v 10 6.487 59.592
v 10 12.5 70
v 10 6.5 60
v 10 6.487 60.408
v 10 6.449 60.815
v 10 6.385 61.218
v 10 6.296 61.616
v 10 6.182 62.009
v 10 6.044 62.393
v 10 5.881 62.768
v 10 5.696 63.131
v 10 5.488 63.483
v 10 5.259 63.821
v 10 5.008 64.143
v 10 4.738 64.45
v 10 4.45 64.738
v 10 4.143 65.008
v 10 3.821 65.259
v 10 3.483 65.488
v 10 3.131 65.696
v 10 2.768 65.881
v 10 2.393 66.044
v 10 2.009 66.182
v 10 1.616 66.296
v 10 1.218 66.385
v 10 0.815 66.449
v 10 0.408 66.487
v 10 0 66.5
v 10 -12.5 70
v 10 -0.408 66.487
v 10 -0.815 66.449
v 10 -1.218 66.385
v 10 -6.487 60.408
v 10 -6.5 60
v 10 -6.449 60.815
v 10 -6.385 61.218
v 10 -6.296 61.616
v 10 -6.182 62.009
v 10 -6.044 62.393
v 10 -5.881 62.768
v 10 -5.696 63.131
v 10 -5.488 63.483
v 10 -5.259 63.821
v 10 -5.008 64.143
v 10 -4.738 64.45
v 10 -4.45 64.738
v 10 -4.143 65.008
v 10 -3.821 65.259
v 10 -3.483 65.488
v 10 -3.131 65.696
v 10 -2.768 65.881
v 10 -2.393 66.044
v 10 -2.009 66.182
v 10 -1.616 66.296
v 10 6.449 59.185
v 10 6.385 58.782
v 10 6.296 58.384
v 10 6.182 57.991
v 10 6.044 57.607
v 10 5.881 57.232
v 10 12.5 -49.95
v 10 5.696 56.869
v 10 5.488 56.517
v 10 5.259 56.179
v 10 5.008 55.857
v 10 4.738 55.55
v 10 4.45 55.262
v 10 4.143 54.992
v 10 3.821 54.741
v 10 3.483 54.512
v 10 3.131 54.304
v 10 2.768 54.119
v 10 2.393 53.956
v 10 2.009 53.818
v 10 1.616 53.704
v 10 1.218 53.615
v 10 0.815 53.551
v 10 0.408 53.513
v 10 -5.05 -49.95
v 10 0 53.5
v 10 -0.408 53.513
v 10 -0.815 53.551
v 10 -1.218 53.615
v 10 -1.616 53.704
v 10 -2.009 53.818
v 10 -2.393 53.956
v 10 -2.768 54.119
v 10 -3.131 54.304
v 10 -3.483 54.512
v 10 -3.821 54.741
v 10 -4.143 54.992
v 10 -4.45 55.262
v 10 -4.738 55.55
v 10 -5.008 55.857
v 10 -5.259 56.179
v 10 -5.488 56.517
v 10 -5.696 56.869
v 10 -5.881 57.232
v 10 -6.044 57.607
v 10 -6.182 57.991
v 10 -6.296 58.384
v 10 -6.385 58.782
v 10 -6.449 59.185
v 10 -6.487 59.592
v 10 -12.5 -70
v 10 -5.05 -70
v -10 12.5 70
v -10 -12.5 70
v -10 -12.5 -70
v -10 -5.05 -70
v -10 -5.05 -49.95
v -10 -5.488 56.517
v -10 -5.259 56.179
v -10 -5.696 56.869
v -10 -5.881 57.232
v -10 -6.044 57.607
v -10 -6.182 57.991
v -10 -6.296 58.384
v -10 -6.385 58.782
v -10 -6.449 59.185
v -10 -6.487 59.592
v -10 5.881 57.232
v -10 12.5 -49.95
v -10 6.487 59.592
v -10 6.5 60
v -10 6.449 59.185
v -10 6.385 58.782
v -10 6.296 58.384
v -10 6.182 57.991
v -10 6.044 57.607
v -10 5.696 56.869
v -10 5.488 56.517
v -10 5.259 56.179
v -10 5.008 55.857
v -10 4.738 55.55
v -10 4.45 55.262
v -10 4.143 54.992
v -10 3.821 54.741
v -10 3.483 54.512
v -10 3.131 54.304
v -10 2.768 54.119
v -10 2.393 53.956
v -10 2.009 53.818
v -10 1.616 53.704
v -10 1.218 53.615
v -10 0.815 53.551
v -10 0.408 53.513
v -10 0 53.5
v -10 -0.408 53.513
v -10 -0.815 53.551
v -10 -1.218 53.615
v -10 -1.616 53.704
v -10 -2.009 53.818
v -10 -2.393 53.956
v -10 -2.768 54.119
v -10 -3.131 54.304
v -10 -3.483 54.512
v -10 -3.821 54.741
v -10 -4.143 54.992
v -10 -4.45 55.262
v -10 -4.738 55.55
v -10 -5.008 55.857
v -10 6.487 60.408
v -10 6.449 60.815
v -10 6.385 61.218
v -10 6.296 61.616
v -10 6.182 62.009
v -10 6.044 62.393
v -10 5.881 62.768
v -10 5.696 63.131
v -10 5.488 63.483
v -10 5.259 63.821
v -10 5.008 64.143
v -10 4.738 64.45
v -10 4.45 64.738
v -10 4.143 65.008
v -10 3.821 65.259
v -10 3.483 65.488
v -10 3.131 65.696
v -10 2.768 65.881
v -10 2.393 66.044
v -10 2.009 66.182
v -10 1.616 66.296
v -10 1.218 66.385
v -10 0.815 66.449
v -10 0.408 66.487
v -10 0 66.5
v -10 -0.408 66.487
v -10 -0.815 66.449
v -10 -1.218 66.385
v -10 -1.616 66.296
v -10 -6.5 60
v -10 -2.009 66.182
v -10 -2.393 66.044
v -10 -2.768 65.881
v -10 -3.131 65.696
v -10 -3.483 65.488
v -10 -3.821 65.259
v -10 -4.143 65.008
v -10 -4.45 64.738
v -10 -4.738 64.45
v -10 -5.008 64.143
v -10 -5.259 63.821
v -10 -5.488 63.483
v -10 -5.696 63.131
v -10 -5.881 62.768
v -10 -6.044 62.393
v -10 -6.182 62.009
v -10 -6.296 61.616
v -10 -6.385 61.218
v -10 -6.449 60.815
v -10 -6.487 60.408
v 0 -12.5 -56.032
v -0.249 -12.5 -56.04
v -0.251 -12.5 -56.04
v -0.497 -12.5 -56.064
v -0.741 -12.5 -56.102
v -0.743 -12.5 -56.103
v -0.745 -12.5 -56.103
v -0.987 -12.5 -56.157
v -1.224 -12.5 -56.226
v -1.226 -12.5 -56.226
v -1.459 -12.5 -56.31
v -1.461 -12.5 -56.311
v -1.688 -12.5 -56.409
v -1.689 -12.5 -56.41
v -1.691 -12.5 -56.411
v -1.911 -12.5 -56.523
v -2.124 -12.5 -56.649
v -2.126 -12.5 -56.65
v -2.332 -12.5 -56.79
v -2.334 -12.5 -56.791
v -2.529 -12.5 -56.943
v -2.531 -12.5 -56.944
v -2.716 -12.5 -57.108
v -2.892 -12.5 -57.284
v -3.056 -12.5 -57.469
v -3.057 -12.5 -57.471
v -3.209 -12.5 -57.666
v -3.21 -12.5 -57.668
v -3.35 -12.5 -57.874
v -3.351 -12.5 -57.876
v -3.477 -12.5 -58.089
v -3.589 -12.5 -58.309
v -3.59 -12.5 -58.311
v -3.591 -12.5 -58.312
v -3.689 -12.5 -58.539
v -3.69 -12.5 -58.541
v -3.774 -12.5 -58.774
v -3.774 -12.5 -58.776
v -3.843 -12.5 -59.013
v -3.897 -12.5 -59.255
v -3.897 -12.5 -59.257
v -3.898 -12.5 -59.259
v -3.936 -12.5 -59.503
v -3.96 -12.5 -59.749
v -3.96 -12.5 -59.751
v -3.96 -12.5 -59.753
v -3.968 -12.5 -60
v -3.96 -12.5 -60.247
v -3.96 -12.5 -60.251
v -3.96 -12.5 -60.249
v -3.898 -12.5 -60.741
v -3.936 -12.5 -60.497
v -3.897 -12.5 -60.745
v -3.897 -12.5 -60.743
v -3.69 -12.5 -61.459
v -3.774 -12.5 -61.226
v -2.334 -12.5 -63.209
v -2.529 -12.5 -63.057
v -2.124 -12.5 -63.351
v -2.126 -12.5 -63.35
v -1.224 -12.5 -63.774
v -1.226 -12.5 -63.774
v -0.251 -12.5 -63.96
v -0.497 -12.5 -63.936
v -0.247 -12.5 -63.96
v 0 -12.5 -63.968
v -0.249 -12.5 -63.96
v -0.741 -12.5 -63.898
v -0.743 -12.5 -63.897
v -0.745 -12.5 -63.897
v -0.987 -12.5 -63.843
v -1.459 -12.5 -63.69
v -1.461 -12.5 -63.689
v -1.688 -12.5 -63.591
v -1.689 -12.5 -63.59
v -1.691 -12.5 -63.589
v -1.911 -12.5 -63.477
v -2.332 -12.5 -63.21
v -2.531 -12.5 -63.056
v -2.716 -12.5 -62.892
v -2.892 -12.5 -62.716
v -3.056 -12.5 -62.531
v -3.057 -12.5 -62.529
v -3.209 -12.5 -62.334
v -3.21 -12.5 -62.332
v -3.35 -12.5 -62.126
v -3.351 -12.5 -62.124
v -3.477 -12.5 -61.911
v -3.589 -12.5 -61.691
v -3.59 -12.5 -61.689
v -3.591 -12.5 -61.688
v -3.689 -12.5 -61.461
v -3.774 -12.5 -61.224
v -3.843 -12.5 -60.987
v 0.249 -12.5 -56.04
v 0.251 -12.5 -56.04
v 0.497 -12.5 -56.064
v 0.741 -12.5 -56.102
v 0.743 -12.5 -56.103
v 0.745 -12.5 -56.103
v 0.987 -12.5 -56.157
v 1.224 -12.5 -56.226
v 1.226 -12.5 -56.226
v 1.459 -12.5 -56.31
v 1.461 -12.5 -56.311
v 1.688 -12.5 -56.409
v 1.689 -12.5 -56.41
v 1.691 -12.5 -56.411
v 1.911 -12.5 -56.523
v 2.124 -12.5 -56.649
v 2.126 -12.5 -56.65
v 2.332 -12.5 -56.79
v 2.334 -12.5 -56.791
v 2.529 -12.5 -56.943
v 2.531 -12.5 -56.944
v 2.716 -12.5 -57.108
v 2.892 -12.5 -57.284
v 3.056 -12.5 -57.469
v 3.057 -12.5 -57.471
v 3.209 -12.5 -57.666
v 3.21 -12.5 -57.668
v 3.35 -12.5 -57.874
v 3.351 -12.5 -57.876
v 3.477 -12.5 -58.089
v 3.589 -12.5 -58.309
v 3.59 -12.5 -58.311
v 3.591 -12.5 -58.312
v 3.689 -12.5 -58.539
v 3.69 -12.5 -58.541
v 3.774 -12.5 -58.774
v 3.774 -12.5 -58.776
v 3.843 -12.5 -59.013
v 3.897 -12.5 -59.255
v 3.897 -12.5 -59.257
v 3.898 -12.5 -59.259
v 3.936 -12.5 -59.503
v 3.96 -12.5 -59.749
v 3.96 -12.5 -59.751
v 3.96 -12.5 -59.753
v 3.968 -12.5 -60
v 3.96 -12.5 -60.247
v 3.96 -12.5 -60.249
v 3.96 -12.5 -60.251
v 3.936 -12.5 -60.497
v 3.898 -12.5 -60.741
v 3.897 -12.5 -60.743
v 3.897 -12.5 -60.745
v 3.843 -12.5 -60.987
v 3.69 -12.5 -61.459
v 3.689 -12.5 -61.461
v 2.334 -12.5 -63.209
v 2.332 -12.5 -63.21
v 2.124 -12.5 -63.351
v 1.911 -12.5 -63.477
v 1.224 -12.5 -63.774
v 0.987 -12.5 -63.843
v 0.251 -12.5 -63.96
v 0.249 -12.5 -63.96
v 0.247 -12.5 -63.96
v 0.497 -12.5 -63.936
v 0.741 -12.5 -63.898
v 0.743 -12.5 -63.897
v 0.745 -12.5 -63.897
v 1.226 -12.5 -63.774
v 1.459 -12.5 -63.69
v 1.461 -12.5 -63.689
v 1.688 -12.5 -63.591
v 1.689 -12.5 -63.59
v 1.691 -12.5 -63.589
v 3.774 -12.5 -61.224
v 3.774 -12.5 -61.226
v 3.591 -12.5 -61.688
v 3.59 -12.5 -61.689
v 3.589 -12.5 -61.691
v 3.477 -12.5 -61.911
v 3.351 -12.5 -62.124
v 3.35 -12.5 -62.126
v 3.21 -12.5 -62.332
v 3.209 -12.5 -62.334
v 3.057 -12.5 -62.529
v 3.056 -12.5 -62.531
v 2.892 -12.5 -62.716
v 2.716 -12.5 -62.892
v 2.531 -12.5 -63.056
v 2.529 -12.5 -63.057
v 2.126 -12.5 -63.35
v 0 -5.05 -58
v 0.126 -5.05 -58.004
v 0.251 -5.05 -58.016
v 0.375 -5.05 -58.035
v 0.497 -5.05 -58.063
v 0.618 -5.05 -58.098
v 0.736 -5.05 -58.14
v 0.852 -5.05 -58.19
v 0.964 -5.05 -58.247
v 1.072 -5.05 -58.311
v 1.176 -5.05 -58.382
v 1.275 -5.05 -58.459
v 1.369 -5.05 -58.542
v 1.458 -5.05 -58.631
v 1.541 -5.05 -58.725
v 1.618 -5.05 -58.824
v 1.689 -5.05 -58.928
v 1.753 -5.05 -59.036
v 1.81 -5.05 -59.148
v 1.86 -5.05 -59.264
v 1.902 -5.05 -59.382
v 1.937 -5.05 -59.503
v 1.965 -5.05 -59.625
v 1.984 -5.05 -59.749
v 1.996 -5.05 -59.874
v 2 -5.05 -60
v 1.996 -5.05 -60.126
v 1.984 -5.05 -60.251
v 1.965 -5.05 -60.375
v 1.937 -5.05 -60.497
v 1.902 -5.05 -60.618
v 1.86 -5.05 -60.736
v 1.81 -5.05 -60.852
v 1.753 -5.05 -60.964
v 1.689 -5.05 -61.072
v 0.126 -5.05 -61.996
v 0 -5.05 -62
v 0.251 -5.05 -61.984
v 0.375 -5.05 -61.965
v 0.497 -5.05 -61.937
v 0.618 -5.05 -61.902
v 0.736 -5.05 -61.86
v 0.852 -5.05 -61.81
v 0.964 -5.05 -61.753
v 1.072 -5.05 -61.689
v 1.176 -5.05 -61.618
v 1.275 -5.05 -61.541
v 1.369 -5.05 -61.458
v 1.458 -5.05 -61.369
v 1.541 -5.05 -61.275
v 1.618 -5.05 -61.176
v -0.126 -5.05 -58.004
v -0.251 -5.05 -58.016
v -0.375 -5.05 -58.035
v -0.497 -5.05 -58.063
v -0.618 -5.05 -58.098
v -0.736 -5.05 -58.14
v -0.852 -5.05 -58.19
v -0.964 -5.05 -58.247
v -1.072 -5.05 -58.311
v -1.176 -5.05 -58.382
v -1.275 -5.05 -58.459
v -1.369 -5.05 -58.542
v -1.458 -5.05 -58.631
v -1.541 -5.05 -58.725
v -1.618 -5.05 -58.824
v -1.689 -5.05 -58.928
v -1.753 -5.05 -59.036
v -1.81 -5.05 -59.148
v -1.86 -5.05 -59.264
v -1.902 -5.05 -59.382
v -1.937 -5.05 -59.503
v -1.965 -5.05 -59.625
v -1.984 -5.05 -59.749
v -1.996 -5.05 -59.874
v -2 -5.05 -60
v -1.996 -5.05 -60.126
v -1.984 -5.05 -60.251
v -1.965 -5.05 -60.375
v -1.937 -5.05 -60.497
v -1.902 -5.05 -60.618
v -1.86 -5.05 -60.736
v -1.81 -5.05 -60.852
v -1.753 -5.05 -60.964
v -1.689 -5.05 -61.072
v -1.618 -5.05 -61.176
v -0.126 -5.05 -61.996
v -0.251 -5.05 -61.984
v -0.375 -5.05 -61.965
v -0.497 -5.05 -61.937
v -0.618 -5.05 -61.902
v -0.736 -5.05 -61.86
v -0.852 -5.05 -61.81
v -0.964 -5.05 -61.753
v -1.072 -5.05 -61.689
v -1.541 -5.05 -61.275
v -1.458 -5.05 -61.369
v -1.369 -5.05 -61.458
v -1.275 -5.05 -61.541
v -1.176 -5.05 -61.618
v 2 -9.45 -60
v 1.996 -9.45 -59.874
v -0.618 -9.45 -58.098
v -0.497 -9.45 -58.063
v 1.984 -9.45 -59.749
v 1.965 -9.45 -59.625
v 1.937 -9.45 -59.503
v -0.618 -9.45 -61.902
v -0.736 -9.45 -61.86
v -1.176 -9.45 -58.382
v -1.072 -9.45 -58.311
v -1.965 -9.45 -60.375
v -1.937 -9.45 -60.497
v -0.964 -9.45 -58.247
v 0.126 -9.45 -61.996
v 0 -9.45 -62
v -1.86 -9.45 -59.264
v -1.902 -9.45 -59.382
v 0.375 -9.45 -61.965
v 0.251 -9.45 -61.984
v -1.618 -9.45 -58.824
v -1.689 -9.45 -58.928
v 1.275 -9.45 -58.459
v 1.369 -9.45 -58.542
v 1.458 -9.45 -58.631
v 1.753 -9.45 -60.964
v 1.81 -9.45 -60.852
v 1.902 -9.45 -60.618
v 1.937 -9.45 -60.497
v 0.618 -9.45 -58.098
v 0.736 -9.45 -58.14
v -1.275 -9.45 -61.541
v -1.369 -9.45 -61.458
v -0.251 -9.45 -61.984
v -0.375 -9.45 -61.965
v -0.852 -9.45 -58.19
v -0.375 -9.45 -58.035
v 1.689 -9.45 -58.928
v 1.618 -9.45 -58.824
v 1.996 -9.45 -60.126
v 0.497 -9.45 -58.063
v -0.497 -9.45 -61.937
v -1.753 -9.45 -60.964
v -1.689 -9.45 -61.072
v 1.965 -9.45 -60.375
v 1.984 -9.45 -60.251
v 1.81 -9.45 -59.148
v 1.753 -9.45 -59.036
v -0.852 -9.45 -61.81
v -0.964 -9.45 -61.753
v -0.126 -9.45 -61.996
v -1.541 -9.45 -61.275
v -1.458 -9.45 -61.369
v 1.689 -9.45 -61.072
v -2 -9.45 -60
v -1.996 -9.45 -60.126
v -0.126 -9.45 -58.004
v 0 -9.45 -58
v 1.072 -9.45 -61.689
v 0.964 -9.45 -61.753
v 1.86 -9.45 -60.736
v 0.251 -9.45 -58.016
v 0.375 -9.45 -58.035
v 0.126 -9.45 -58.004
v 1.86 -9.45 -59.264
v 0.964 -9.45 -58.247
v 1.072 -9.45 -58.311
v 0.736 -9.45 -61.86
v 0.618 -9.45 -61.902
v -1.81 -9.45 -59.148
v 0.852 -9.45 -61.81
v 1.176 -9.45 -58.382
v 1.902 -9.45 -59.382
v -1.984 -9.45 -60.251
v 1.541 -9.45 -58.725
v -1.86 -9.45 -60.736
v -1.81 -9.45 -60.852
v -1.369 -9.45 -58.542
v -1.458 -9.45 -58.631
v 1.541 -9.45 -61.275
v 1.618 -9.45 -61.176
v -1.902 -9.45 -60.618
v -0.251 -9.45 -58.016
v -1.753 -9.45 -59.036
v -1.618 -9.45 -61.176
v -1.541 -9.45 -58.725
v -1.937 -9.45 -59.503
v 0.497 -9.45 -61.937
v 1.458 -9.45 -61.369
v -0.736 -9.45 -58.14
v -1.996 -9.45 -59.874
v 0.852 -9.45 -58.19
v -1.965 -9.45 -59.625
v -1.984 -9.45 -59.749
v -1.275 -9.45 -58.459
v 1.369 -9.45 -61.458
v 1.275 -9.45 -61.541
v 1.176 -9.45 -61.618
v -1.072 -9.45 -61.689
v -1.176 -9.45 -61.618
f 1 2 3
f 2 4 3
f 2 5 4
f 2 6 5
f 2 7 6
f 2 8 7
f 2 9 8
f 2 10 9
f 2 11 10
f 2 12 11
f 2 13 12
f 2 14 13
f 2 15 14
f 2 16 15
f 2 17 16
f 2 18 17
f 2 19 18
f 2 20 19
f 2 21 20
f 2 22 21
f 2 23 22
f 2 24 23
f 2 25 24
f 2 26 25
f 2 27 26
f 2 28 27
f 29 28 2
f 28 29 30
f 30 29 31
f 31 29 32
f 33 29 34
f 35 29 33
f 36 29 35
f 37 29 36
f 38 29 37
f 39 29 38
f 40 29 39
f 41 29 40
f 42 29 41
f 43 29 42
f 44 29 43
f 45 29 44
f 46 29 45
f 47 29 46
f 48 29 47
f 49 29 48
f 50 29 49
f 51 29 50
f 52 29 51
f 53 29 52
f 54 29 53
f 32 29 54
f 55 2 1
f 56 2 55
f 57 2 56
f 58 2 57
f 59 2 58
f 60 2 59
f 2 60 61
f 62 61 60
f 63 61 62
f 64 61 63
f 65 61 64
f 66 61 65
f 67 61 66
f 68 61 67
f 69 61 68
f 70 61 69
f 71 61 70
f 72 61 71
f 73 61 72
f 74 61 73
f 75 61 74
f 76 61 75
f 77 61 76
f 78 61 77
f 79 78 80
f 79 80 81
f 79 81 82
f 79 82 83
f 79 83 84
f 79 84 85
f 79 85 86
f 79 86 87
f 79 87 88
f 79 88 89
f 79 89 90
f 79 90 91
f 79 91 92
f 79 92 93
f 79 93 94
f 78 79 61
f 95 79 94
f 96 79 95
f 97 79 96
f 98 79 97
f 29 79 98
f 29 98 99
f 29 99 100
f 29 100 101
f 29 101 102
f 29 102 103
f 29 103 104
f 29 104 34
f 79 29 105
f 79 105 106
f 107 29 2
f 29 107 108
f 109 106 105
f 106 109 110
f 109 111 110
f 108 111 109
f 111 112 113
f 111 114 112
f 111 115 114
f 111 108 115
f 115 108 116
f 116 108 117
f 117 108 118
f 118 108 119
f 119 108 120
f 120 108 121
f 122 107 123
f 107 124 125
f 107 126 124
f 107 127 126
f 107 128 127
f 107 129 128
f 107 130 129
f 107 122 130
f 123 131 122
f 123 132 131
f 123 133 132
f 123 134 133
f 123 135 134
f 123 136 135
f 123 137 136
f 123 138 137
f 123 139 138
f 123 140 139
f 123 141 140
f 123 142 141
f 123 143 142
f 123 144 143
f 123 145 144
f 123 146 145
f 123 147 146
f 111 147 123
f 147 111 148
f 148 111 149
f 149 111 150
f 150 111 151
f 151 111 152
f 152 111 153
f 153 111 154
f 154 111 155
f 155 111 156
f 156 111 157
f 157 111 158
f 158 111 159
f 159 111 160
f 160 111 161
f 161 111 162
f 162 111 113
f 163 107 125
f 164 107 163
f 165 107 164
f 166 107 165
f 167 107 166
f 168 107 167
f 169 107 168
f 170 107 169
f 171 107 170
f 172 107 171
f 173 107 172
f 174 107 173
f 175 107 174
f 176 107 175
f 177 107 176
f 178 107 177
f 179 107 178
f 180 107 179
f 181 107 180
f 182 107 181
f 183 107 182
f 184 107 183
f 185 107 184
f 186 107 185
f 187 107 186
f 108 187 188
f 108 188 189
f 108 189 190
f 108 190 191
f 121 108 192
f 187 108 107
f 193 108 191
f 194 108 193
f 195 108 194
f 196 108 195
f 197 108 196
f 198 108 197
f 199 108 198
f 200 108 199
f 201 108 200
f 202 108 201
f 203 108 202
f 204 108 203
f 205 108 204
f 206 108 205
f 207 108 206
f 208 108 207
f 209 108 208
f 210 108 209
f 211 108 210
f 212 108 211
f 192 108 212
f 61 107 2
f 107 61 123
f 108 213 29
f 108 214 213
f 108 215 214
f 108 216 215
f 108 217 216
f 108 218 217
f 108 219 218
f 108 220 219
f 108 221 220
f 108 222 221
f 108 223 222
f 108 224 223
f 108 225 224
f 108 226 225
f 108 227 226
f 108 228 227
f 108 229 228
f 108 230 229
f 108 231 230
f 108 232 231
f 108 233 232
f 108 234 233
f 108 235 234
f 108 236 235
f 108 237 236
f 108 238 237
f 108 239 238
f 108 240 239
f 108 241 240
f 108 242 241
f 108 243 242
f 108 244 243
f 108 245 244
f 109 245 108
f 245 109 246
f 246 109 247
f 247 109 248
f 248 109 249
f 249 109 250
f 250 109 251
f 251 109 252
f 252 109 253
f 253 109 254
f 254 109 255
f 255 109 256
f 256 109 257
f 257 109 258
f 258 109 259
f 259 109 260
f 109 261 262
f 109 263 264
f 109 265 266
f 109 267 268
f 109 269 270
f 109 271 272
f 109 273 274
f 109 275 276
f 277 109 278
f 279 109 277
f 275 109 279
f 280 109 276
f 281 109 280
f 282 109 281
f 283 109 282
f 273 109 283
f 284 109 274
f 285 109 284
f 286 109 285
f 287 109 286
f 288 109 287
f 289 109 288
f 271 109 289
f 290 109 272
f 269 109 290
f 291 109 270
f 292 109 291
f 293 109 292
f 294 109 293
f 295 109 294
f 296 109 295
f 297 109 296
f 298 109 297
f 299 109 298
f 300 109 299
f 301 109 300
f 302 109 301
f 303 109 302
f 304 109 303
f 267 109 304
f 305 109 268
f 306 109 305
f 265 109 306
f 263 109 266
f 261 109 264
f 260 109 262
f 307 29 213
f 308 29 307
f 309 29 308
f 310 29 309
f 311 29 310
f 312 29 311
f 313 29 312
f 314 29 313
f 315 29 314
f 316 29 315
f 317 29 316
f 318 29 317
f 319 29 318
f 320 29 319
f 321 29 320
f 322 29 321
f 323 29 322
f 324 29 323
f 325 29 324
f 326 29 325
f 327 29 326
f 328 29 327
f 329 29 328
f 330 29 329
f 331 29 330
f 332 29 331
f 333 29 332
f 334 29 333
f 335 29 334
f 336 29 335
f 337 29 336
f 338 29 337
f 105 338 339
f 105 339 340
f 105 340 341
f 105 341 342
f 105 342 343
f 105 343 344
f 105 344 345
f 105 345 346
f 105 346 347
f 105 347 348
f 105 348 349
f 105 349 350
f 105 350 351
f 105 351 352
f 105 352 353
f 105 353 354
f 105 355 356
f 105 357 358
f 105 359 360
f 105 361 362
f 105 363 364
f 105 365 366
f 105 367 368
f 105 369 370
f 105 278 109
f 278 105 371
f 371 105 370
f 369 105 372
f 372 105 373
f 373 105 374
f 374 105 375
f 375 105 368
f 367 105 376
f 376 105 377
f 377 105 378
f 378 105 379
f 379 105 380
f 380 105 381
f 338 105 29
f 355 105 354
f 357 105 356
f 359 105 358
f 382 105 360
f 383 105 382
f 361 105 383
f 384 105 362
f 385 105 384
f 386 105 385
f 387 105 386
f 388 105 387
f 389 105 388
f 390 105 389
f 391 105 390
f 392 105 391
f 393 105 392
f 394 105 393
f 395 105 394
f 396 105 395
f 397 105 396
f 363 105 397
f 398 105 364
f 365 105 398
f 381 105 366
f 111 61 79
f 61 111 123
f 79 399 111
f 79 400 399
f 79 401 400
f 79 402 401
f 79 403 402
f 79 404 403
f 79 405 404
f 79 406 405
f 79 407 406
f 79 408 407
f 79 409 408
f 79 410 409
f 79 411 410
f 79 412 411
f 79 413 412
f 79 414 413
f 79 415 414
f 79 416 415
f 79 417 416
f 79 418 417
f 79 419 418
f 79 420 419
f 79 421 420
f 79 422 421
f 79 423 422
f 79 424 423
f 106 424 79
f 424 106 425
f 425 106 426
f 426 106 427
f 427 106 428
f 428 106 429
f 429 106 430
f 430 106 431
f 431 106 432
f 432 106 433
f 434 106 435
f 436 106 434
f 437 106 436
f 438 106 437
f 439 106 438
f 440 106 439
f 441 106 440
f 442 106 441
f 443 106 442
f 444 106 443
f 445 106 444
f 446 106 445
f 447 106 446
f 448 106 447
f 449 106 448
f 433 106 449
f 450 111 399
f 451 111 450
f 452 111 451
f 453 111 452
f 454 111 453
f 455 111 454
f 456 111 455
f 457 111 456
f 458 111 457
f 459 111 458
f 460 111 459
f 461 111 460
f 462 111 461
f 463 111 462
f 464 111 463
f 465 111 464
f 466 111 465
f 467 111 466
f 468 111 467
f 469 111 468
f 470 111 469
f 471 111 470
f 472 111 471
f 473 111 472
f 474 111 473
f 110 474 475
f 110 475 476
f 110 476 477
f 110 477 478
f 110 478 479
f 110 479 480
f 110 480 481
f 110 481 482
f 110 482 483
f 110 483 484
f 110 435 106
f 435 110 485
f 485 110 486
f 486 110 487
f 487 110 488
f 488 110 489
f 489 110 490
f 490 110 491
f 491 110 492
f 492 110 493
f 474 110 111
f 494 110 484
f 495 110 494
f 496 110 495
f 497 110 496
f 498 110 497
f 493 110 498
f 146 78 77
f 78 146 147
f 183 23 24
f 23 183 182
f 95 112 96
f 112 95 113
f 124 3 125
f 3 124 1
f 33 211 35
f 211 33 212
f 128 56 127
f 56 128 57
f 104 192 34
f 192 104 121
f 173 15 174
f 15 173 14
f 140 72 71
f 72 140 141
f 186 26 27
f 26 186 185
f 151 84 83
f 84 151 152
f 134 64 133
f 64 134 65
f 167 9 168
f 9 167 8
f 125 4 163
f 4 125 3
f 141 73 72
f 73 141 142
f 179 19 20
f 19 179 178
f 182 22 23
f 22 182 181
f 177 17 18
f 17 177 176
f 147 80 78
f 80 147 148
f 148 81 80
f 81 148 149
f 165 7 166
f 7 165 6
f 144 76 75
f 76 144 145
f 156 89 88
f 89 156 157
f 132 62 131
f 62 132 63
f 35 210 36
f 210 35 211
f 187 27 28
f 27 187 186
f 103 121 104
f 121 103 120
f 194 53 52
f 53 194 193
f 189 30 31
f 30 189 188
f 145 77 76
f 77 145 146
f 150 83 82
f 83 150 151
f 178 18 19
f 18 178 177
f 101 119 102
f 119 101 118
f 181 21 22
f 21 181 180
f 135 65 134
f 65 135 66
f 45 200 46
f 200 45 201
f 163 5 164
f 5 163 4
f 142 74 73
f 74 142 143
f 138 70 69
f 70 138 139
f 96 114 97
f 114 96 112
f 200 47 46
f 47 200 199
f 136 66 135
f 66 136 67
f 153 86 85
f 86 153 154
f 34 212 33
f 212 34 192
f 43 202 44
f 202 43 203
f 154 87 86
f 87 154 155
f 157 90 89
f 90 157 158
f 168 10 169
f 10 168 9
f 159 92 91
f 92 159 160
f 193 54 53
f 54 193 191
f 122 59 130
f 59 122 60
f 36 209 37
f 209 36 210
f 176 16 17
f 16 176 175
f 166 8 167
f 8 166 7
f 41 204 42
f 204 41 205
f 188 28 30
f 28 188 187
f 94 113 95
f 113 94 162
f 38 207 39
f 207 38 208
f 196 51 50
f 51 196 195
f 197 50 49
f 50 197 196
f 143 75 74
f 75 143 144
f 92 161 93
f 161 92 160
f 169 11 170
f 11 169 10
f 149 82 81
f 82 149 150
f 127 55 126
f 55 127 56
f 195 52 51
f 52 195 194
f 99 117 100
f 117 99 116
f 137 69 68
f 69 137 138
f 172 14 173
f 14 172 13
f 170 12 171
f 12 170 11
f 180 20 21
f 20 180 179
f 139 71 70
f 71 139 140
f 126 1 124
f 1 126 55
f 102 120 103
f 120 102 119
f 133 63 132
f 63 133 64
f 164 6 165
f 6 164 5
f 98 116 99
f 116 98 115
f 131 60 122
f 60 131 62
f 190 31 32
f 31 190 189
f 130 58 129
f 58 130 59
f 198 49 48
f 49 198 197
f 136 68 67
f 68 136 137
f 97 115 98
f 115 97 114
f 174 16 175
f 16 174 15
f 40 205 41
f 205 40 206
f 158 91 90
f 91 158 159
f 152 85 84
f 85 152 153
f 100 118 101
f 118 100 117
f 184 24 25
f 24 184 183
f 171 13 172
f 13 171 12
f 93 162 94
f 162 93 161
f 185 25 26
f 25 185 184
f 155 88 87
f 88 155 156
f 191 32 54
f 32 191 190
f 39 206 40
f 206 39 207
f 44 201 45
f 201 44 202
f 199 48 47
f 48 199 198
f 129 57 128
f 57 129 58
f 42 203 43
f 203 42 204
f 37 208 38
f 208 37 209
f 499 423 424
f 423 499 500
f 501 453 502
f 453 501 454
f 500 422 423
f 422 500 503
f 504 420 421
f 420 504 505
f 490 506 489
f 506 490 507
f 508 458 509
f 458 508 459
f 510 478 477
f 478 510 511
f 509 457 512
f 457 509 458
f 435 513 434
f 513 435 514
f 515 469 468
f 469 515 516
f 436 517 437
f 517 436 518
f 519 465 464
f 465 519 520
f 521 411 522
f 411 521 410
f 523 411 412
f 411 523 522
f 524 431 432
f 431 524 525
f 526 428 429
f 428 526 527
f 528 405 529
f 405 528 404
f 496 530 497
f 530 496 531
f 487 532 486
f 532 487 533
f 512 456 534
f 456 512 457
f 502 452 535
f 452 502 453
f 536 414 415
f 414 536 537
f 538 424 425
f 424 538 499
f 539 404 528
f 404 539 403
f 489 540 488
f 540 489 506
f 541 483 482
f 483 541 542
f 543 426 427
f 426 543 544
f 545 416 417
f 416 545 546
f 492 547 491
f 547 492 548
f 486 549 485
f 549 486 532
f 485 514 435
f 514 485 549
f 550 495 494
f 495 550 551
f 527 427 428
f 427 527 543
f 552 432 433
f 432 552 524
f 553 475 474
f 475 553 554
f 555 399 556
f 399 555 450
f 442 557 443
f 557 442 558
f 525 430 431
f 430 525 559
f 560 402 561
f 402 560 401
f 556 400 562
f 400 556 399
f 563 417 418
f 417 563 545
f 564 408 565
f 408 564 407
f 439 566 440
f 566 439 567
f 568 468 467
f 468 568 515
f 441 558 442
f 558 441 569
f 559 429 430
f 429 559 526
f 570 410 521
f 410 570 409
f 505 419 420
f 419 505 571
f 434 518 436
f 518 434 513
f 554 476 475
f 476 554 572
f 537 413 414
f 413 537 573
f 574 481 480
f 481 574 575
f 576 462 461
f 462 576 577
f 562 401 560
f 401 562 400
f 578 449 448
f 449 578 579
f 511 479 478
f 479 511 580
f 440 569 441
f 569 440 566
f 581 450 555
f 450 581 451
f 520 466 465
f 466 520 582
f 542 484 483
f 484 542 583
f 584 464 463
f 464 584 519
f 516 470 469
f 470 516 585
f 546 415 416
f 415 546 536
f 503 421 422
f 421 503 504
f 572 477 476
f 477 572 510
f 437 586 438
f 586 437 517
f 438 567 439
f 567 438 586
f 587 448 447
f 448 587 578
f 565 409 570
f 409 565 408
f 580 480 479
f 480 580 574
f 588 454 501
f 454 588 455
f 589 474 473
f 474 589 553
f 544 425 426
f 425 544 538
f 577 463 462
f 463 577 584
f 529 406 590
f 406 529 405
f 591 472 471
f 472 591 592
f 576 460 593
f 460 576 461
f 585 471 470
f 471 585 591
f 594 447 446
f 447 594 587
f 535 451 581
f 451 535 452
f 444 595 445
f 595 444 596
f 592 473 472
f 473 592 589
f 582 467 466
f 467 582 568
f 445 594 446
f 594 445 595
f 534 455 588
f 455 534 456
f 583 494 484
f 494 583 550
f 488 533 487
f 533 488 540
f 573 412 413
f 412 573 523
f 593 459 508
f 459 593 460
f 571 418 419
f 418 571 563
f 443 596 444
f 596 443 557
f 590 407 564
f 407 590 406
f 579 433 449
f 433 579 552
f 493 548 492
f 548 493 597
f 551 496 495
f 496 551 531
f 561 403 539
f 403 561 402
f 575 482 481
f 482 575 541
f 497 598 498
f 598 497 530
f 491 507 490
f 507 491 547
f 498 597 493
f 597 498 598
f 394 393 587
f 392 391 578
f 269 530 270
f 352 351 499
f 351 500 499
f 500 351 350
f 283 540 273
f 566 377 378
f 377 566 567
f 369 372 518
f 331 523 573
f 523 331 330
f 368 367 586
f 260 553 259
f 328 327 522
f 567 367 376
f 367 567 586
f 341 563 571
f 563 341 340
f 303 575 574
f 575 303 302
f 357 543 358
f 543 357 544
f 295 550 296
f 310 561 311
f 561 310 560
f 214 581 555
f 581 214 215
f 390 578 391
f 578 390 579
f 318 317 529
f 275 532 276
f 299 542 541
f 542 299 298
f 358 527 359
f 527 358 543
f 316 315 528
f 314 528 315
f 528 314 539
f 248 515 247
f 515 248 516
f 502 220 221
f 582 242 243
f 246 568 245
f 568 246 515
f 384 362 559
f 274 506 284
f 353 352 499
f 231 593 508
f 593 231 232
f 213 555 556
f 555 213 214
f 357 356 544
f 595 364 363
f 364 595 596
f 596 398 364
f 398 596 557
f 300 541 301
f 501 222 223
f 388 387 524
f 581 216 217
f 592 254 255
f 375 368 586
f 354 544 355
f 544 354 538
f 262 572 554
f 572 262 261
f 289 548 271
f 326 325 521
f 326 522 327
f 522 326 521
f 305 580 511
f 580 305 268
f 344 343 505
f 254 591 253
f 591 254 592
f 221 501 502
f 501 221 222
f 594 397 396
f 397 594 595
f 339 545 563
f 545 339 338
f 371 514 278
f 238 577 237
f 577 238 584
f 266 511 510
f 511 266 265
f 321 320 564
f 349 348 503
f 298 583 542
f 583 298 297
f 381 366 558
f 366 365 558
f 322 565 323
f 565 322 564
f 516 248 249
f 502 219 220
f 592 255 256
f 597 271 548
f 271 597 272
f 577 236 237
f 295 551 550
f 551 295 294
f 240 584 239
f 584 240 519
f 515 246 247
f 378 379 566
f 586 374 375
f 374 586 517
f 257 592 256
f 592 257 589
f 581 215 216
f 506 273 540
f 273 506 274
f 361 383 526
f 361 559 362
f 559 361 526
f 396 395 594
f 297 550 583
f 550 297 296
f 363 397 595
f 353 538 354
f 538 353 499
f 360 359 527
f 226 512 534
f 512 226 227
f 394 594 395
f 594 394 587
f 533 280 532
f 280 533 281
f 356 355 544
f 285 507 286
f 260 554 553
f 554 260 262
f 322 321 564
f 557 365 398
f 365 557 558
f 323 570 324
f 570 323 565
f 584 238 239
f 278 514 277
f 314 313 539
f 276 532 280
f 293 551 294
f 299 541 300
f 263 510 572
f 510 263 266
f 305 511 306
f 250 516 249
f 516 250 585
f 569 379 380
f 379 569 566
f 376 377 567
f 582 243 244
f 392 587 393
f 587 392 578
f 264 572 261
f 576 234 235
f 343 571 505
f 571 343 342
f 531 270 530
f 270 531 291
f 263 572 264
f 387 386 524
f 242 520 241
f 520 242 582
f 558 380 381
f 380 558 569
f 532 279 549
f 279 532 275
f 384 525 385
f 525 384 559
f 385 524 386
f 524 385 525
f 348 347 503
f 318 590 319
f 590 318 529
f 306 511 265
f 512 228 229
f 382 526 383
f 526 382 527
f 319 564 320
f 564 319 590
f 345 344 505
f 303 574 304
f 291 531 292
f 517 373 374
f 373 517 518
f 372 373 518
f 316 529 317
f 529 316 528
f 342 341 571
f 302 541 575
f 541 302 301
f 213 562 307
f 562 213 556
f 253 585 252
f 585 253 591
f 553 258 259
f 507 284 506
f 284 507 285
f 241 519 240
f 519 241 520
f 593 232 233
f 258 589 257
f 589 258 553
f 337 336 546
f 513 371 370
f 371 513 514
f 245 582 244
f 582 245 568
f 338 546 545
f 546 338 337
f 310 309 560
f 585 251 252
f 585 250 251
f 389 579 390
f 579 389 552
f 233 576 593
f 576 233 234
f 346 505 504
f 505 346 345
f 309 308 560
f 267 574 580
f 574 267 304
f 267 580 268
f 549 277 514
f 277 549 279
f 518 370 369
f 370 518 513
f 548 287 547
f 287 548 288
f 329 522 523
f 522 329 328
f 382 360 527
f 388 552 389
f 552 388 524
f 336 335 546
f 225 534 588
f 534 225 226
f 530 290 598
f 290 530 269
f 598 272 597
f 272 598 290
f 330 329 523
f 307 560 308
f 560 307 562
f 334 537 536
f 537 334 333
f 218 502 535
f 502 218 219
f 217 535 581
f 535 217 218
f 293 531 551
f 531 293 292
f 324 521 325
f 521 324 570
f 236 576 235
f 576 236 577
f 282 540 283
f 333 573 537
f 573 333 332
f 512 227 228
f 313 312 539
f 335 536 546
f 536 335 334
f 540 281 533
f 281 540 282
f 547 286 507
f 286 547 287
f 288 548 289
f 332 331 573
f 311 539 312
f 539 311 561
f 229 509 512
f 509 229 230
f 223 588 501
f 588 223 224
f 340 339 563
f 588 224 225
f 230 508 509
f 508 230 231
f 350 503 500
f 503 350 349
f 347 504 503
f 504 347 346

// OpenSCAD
$fn=100;

difference(){
cube([20,25,100+20+20],center=true);

translate([0,5,-60])
cube([20.1,20.1,20.1],center=true);

translate([0,0,60])
rotate([0,90,0])
cylinder(r=6.5,h=21,center=true);

translate([0,0,-60])
rotate([90,0,0])
cylinder(r=2,h=31,center=true);
translate([0,-12.5+1.5,-60])
rotate([90,0,0])
cylinder(r1=2,r2=4,h=3.1,center=true);
}
